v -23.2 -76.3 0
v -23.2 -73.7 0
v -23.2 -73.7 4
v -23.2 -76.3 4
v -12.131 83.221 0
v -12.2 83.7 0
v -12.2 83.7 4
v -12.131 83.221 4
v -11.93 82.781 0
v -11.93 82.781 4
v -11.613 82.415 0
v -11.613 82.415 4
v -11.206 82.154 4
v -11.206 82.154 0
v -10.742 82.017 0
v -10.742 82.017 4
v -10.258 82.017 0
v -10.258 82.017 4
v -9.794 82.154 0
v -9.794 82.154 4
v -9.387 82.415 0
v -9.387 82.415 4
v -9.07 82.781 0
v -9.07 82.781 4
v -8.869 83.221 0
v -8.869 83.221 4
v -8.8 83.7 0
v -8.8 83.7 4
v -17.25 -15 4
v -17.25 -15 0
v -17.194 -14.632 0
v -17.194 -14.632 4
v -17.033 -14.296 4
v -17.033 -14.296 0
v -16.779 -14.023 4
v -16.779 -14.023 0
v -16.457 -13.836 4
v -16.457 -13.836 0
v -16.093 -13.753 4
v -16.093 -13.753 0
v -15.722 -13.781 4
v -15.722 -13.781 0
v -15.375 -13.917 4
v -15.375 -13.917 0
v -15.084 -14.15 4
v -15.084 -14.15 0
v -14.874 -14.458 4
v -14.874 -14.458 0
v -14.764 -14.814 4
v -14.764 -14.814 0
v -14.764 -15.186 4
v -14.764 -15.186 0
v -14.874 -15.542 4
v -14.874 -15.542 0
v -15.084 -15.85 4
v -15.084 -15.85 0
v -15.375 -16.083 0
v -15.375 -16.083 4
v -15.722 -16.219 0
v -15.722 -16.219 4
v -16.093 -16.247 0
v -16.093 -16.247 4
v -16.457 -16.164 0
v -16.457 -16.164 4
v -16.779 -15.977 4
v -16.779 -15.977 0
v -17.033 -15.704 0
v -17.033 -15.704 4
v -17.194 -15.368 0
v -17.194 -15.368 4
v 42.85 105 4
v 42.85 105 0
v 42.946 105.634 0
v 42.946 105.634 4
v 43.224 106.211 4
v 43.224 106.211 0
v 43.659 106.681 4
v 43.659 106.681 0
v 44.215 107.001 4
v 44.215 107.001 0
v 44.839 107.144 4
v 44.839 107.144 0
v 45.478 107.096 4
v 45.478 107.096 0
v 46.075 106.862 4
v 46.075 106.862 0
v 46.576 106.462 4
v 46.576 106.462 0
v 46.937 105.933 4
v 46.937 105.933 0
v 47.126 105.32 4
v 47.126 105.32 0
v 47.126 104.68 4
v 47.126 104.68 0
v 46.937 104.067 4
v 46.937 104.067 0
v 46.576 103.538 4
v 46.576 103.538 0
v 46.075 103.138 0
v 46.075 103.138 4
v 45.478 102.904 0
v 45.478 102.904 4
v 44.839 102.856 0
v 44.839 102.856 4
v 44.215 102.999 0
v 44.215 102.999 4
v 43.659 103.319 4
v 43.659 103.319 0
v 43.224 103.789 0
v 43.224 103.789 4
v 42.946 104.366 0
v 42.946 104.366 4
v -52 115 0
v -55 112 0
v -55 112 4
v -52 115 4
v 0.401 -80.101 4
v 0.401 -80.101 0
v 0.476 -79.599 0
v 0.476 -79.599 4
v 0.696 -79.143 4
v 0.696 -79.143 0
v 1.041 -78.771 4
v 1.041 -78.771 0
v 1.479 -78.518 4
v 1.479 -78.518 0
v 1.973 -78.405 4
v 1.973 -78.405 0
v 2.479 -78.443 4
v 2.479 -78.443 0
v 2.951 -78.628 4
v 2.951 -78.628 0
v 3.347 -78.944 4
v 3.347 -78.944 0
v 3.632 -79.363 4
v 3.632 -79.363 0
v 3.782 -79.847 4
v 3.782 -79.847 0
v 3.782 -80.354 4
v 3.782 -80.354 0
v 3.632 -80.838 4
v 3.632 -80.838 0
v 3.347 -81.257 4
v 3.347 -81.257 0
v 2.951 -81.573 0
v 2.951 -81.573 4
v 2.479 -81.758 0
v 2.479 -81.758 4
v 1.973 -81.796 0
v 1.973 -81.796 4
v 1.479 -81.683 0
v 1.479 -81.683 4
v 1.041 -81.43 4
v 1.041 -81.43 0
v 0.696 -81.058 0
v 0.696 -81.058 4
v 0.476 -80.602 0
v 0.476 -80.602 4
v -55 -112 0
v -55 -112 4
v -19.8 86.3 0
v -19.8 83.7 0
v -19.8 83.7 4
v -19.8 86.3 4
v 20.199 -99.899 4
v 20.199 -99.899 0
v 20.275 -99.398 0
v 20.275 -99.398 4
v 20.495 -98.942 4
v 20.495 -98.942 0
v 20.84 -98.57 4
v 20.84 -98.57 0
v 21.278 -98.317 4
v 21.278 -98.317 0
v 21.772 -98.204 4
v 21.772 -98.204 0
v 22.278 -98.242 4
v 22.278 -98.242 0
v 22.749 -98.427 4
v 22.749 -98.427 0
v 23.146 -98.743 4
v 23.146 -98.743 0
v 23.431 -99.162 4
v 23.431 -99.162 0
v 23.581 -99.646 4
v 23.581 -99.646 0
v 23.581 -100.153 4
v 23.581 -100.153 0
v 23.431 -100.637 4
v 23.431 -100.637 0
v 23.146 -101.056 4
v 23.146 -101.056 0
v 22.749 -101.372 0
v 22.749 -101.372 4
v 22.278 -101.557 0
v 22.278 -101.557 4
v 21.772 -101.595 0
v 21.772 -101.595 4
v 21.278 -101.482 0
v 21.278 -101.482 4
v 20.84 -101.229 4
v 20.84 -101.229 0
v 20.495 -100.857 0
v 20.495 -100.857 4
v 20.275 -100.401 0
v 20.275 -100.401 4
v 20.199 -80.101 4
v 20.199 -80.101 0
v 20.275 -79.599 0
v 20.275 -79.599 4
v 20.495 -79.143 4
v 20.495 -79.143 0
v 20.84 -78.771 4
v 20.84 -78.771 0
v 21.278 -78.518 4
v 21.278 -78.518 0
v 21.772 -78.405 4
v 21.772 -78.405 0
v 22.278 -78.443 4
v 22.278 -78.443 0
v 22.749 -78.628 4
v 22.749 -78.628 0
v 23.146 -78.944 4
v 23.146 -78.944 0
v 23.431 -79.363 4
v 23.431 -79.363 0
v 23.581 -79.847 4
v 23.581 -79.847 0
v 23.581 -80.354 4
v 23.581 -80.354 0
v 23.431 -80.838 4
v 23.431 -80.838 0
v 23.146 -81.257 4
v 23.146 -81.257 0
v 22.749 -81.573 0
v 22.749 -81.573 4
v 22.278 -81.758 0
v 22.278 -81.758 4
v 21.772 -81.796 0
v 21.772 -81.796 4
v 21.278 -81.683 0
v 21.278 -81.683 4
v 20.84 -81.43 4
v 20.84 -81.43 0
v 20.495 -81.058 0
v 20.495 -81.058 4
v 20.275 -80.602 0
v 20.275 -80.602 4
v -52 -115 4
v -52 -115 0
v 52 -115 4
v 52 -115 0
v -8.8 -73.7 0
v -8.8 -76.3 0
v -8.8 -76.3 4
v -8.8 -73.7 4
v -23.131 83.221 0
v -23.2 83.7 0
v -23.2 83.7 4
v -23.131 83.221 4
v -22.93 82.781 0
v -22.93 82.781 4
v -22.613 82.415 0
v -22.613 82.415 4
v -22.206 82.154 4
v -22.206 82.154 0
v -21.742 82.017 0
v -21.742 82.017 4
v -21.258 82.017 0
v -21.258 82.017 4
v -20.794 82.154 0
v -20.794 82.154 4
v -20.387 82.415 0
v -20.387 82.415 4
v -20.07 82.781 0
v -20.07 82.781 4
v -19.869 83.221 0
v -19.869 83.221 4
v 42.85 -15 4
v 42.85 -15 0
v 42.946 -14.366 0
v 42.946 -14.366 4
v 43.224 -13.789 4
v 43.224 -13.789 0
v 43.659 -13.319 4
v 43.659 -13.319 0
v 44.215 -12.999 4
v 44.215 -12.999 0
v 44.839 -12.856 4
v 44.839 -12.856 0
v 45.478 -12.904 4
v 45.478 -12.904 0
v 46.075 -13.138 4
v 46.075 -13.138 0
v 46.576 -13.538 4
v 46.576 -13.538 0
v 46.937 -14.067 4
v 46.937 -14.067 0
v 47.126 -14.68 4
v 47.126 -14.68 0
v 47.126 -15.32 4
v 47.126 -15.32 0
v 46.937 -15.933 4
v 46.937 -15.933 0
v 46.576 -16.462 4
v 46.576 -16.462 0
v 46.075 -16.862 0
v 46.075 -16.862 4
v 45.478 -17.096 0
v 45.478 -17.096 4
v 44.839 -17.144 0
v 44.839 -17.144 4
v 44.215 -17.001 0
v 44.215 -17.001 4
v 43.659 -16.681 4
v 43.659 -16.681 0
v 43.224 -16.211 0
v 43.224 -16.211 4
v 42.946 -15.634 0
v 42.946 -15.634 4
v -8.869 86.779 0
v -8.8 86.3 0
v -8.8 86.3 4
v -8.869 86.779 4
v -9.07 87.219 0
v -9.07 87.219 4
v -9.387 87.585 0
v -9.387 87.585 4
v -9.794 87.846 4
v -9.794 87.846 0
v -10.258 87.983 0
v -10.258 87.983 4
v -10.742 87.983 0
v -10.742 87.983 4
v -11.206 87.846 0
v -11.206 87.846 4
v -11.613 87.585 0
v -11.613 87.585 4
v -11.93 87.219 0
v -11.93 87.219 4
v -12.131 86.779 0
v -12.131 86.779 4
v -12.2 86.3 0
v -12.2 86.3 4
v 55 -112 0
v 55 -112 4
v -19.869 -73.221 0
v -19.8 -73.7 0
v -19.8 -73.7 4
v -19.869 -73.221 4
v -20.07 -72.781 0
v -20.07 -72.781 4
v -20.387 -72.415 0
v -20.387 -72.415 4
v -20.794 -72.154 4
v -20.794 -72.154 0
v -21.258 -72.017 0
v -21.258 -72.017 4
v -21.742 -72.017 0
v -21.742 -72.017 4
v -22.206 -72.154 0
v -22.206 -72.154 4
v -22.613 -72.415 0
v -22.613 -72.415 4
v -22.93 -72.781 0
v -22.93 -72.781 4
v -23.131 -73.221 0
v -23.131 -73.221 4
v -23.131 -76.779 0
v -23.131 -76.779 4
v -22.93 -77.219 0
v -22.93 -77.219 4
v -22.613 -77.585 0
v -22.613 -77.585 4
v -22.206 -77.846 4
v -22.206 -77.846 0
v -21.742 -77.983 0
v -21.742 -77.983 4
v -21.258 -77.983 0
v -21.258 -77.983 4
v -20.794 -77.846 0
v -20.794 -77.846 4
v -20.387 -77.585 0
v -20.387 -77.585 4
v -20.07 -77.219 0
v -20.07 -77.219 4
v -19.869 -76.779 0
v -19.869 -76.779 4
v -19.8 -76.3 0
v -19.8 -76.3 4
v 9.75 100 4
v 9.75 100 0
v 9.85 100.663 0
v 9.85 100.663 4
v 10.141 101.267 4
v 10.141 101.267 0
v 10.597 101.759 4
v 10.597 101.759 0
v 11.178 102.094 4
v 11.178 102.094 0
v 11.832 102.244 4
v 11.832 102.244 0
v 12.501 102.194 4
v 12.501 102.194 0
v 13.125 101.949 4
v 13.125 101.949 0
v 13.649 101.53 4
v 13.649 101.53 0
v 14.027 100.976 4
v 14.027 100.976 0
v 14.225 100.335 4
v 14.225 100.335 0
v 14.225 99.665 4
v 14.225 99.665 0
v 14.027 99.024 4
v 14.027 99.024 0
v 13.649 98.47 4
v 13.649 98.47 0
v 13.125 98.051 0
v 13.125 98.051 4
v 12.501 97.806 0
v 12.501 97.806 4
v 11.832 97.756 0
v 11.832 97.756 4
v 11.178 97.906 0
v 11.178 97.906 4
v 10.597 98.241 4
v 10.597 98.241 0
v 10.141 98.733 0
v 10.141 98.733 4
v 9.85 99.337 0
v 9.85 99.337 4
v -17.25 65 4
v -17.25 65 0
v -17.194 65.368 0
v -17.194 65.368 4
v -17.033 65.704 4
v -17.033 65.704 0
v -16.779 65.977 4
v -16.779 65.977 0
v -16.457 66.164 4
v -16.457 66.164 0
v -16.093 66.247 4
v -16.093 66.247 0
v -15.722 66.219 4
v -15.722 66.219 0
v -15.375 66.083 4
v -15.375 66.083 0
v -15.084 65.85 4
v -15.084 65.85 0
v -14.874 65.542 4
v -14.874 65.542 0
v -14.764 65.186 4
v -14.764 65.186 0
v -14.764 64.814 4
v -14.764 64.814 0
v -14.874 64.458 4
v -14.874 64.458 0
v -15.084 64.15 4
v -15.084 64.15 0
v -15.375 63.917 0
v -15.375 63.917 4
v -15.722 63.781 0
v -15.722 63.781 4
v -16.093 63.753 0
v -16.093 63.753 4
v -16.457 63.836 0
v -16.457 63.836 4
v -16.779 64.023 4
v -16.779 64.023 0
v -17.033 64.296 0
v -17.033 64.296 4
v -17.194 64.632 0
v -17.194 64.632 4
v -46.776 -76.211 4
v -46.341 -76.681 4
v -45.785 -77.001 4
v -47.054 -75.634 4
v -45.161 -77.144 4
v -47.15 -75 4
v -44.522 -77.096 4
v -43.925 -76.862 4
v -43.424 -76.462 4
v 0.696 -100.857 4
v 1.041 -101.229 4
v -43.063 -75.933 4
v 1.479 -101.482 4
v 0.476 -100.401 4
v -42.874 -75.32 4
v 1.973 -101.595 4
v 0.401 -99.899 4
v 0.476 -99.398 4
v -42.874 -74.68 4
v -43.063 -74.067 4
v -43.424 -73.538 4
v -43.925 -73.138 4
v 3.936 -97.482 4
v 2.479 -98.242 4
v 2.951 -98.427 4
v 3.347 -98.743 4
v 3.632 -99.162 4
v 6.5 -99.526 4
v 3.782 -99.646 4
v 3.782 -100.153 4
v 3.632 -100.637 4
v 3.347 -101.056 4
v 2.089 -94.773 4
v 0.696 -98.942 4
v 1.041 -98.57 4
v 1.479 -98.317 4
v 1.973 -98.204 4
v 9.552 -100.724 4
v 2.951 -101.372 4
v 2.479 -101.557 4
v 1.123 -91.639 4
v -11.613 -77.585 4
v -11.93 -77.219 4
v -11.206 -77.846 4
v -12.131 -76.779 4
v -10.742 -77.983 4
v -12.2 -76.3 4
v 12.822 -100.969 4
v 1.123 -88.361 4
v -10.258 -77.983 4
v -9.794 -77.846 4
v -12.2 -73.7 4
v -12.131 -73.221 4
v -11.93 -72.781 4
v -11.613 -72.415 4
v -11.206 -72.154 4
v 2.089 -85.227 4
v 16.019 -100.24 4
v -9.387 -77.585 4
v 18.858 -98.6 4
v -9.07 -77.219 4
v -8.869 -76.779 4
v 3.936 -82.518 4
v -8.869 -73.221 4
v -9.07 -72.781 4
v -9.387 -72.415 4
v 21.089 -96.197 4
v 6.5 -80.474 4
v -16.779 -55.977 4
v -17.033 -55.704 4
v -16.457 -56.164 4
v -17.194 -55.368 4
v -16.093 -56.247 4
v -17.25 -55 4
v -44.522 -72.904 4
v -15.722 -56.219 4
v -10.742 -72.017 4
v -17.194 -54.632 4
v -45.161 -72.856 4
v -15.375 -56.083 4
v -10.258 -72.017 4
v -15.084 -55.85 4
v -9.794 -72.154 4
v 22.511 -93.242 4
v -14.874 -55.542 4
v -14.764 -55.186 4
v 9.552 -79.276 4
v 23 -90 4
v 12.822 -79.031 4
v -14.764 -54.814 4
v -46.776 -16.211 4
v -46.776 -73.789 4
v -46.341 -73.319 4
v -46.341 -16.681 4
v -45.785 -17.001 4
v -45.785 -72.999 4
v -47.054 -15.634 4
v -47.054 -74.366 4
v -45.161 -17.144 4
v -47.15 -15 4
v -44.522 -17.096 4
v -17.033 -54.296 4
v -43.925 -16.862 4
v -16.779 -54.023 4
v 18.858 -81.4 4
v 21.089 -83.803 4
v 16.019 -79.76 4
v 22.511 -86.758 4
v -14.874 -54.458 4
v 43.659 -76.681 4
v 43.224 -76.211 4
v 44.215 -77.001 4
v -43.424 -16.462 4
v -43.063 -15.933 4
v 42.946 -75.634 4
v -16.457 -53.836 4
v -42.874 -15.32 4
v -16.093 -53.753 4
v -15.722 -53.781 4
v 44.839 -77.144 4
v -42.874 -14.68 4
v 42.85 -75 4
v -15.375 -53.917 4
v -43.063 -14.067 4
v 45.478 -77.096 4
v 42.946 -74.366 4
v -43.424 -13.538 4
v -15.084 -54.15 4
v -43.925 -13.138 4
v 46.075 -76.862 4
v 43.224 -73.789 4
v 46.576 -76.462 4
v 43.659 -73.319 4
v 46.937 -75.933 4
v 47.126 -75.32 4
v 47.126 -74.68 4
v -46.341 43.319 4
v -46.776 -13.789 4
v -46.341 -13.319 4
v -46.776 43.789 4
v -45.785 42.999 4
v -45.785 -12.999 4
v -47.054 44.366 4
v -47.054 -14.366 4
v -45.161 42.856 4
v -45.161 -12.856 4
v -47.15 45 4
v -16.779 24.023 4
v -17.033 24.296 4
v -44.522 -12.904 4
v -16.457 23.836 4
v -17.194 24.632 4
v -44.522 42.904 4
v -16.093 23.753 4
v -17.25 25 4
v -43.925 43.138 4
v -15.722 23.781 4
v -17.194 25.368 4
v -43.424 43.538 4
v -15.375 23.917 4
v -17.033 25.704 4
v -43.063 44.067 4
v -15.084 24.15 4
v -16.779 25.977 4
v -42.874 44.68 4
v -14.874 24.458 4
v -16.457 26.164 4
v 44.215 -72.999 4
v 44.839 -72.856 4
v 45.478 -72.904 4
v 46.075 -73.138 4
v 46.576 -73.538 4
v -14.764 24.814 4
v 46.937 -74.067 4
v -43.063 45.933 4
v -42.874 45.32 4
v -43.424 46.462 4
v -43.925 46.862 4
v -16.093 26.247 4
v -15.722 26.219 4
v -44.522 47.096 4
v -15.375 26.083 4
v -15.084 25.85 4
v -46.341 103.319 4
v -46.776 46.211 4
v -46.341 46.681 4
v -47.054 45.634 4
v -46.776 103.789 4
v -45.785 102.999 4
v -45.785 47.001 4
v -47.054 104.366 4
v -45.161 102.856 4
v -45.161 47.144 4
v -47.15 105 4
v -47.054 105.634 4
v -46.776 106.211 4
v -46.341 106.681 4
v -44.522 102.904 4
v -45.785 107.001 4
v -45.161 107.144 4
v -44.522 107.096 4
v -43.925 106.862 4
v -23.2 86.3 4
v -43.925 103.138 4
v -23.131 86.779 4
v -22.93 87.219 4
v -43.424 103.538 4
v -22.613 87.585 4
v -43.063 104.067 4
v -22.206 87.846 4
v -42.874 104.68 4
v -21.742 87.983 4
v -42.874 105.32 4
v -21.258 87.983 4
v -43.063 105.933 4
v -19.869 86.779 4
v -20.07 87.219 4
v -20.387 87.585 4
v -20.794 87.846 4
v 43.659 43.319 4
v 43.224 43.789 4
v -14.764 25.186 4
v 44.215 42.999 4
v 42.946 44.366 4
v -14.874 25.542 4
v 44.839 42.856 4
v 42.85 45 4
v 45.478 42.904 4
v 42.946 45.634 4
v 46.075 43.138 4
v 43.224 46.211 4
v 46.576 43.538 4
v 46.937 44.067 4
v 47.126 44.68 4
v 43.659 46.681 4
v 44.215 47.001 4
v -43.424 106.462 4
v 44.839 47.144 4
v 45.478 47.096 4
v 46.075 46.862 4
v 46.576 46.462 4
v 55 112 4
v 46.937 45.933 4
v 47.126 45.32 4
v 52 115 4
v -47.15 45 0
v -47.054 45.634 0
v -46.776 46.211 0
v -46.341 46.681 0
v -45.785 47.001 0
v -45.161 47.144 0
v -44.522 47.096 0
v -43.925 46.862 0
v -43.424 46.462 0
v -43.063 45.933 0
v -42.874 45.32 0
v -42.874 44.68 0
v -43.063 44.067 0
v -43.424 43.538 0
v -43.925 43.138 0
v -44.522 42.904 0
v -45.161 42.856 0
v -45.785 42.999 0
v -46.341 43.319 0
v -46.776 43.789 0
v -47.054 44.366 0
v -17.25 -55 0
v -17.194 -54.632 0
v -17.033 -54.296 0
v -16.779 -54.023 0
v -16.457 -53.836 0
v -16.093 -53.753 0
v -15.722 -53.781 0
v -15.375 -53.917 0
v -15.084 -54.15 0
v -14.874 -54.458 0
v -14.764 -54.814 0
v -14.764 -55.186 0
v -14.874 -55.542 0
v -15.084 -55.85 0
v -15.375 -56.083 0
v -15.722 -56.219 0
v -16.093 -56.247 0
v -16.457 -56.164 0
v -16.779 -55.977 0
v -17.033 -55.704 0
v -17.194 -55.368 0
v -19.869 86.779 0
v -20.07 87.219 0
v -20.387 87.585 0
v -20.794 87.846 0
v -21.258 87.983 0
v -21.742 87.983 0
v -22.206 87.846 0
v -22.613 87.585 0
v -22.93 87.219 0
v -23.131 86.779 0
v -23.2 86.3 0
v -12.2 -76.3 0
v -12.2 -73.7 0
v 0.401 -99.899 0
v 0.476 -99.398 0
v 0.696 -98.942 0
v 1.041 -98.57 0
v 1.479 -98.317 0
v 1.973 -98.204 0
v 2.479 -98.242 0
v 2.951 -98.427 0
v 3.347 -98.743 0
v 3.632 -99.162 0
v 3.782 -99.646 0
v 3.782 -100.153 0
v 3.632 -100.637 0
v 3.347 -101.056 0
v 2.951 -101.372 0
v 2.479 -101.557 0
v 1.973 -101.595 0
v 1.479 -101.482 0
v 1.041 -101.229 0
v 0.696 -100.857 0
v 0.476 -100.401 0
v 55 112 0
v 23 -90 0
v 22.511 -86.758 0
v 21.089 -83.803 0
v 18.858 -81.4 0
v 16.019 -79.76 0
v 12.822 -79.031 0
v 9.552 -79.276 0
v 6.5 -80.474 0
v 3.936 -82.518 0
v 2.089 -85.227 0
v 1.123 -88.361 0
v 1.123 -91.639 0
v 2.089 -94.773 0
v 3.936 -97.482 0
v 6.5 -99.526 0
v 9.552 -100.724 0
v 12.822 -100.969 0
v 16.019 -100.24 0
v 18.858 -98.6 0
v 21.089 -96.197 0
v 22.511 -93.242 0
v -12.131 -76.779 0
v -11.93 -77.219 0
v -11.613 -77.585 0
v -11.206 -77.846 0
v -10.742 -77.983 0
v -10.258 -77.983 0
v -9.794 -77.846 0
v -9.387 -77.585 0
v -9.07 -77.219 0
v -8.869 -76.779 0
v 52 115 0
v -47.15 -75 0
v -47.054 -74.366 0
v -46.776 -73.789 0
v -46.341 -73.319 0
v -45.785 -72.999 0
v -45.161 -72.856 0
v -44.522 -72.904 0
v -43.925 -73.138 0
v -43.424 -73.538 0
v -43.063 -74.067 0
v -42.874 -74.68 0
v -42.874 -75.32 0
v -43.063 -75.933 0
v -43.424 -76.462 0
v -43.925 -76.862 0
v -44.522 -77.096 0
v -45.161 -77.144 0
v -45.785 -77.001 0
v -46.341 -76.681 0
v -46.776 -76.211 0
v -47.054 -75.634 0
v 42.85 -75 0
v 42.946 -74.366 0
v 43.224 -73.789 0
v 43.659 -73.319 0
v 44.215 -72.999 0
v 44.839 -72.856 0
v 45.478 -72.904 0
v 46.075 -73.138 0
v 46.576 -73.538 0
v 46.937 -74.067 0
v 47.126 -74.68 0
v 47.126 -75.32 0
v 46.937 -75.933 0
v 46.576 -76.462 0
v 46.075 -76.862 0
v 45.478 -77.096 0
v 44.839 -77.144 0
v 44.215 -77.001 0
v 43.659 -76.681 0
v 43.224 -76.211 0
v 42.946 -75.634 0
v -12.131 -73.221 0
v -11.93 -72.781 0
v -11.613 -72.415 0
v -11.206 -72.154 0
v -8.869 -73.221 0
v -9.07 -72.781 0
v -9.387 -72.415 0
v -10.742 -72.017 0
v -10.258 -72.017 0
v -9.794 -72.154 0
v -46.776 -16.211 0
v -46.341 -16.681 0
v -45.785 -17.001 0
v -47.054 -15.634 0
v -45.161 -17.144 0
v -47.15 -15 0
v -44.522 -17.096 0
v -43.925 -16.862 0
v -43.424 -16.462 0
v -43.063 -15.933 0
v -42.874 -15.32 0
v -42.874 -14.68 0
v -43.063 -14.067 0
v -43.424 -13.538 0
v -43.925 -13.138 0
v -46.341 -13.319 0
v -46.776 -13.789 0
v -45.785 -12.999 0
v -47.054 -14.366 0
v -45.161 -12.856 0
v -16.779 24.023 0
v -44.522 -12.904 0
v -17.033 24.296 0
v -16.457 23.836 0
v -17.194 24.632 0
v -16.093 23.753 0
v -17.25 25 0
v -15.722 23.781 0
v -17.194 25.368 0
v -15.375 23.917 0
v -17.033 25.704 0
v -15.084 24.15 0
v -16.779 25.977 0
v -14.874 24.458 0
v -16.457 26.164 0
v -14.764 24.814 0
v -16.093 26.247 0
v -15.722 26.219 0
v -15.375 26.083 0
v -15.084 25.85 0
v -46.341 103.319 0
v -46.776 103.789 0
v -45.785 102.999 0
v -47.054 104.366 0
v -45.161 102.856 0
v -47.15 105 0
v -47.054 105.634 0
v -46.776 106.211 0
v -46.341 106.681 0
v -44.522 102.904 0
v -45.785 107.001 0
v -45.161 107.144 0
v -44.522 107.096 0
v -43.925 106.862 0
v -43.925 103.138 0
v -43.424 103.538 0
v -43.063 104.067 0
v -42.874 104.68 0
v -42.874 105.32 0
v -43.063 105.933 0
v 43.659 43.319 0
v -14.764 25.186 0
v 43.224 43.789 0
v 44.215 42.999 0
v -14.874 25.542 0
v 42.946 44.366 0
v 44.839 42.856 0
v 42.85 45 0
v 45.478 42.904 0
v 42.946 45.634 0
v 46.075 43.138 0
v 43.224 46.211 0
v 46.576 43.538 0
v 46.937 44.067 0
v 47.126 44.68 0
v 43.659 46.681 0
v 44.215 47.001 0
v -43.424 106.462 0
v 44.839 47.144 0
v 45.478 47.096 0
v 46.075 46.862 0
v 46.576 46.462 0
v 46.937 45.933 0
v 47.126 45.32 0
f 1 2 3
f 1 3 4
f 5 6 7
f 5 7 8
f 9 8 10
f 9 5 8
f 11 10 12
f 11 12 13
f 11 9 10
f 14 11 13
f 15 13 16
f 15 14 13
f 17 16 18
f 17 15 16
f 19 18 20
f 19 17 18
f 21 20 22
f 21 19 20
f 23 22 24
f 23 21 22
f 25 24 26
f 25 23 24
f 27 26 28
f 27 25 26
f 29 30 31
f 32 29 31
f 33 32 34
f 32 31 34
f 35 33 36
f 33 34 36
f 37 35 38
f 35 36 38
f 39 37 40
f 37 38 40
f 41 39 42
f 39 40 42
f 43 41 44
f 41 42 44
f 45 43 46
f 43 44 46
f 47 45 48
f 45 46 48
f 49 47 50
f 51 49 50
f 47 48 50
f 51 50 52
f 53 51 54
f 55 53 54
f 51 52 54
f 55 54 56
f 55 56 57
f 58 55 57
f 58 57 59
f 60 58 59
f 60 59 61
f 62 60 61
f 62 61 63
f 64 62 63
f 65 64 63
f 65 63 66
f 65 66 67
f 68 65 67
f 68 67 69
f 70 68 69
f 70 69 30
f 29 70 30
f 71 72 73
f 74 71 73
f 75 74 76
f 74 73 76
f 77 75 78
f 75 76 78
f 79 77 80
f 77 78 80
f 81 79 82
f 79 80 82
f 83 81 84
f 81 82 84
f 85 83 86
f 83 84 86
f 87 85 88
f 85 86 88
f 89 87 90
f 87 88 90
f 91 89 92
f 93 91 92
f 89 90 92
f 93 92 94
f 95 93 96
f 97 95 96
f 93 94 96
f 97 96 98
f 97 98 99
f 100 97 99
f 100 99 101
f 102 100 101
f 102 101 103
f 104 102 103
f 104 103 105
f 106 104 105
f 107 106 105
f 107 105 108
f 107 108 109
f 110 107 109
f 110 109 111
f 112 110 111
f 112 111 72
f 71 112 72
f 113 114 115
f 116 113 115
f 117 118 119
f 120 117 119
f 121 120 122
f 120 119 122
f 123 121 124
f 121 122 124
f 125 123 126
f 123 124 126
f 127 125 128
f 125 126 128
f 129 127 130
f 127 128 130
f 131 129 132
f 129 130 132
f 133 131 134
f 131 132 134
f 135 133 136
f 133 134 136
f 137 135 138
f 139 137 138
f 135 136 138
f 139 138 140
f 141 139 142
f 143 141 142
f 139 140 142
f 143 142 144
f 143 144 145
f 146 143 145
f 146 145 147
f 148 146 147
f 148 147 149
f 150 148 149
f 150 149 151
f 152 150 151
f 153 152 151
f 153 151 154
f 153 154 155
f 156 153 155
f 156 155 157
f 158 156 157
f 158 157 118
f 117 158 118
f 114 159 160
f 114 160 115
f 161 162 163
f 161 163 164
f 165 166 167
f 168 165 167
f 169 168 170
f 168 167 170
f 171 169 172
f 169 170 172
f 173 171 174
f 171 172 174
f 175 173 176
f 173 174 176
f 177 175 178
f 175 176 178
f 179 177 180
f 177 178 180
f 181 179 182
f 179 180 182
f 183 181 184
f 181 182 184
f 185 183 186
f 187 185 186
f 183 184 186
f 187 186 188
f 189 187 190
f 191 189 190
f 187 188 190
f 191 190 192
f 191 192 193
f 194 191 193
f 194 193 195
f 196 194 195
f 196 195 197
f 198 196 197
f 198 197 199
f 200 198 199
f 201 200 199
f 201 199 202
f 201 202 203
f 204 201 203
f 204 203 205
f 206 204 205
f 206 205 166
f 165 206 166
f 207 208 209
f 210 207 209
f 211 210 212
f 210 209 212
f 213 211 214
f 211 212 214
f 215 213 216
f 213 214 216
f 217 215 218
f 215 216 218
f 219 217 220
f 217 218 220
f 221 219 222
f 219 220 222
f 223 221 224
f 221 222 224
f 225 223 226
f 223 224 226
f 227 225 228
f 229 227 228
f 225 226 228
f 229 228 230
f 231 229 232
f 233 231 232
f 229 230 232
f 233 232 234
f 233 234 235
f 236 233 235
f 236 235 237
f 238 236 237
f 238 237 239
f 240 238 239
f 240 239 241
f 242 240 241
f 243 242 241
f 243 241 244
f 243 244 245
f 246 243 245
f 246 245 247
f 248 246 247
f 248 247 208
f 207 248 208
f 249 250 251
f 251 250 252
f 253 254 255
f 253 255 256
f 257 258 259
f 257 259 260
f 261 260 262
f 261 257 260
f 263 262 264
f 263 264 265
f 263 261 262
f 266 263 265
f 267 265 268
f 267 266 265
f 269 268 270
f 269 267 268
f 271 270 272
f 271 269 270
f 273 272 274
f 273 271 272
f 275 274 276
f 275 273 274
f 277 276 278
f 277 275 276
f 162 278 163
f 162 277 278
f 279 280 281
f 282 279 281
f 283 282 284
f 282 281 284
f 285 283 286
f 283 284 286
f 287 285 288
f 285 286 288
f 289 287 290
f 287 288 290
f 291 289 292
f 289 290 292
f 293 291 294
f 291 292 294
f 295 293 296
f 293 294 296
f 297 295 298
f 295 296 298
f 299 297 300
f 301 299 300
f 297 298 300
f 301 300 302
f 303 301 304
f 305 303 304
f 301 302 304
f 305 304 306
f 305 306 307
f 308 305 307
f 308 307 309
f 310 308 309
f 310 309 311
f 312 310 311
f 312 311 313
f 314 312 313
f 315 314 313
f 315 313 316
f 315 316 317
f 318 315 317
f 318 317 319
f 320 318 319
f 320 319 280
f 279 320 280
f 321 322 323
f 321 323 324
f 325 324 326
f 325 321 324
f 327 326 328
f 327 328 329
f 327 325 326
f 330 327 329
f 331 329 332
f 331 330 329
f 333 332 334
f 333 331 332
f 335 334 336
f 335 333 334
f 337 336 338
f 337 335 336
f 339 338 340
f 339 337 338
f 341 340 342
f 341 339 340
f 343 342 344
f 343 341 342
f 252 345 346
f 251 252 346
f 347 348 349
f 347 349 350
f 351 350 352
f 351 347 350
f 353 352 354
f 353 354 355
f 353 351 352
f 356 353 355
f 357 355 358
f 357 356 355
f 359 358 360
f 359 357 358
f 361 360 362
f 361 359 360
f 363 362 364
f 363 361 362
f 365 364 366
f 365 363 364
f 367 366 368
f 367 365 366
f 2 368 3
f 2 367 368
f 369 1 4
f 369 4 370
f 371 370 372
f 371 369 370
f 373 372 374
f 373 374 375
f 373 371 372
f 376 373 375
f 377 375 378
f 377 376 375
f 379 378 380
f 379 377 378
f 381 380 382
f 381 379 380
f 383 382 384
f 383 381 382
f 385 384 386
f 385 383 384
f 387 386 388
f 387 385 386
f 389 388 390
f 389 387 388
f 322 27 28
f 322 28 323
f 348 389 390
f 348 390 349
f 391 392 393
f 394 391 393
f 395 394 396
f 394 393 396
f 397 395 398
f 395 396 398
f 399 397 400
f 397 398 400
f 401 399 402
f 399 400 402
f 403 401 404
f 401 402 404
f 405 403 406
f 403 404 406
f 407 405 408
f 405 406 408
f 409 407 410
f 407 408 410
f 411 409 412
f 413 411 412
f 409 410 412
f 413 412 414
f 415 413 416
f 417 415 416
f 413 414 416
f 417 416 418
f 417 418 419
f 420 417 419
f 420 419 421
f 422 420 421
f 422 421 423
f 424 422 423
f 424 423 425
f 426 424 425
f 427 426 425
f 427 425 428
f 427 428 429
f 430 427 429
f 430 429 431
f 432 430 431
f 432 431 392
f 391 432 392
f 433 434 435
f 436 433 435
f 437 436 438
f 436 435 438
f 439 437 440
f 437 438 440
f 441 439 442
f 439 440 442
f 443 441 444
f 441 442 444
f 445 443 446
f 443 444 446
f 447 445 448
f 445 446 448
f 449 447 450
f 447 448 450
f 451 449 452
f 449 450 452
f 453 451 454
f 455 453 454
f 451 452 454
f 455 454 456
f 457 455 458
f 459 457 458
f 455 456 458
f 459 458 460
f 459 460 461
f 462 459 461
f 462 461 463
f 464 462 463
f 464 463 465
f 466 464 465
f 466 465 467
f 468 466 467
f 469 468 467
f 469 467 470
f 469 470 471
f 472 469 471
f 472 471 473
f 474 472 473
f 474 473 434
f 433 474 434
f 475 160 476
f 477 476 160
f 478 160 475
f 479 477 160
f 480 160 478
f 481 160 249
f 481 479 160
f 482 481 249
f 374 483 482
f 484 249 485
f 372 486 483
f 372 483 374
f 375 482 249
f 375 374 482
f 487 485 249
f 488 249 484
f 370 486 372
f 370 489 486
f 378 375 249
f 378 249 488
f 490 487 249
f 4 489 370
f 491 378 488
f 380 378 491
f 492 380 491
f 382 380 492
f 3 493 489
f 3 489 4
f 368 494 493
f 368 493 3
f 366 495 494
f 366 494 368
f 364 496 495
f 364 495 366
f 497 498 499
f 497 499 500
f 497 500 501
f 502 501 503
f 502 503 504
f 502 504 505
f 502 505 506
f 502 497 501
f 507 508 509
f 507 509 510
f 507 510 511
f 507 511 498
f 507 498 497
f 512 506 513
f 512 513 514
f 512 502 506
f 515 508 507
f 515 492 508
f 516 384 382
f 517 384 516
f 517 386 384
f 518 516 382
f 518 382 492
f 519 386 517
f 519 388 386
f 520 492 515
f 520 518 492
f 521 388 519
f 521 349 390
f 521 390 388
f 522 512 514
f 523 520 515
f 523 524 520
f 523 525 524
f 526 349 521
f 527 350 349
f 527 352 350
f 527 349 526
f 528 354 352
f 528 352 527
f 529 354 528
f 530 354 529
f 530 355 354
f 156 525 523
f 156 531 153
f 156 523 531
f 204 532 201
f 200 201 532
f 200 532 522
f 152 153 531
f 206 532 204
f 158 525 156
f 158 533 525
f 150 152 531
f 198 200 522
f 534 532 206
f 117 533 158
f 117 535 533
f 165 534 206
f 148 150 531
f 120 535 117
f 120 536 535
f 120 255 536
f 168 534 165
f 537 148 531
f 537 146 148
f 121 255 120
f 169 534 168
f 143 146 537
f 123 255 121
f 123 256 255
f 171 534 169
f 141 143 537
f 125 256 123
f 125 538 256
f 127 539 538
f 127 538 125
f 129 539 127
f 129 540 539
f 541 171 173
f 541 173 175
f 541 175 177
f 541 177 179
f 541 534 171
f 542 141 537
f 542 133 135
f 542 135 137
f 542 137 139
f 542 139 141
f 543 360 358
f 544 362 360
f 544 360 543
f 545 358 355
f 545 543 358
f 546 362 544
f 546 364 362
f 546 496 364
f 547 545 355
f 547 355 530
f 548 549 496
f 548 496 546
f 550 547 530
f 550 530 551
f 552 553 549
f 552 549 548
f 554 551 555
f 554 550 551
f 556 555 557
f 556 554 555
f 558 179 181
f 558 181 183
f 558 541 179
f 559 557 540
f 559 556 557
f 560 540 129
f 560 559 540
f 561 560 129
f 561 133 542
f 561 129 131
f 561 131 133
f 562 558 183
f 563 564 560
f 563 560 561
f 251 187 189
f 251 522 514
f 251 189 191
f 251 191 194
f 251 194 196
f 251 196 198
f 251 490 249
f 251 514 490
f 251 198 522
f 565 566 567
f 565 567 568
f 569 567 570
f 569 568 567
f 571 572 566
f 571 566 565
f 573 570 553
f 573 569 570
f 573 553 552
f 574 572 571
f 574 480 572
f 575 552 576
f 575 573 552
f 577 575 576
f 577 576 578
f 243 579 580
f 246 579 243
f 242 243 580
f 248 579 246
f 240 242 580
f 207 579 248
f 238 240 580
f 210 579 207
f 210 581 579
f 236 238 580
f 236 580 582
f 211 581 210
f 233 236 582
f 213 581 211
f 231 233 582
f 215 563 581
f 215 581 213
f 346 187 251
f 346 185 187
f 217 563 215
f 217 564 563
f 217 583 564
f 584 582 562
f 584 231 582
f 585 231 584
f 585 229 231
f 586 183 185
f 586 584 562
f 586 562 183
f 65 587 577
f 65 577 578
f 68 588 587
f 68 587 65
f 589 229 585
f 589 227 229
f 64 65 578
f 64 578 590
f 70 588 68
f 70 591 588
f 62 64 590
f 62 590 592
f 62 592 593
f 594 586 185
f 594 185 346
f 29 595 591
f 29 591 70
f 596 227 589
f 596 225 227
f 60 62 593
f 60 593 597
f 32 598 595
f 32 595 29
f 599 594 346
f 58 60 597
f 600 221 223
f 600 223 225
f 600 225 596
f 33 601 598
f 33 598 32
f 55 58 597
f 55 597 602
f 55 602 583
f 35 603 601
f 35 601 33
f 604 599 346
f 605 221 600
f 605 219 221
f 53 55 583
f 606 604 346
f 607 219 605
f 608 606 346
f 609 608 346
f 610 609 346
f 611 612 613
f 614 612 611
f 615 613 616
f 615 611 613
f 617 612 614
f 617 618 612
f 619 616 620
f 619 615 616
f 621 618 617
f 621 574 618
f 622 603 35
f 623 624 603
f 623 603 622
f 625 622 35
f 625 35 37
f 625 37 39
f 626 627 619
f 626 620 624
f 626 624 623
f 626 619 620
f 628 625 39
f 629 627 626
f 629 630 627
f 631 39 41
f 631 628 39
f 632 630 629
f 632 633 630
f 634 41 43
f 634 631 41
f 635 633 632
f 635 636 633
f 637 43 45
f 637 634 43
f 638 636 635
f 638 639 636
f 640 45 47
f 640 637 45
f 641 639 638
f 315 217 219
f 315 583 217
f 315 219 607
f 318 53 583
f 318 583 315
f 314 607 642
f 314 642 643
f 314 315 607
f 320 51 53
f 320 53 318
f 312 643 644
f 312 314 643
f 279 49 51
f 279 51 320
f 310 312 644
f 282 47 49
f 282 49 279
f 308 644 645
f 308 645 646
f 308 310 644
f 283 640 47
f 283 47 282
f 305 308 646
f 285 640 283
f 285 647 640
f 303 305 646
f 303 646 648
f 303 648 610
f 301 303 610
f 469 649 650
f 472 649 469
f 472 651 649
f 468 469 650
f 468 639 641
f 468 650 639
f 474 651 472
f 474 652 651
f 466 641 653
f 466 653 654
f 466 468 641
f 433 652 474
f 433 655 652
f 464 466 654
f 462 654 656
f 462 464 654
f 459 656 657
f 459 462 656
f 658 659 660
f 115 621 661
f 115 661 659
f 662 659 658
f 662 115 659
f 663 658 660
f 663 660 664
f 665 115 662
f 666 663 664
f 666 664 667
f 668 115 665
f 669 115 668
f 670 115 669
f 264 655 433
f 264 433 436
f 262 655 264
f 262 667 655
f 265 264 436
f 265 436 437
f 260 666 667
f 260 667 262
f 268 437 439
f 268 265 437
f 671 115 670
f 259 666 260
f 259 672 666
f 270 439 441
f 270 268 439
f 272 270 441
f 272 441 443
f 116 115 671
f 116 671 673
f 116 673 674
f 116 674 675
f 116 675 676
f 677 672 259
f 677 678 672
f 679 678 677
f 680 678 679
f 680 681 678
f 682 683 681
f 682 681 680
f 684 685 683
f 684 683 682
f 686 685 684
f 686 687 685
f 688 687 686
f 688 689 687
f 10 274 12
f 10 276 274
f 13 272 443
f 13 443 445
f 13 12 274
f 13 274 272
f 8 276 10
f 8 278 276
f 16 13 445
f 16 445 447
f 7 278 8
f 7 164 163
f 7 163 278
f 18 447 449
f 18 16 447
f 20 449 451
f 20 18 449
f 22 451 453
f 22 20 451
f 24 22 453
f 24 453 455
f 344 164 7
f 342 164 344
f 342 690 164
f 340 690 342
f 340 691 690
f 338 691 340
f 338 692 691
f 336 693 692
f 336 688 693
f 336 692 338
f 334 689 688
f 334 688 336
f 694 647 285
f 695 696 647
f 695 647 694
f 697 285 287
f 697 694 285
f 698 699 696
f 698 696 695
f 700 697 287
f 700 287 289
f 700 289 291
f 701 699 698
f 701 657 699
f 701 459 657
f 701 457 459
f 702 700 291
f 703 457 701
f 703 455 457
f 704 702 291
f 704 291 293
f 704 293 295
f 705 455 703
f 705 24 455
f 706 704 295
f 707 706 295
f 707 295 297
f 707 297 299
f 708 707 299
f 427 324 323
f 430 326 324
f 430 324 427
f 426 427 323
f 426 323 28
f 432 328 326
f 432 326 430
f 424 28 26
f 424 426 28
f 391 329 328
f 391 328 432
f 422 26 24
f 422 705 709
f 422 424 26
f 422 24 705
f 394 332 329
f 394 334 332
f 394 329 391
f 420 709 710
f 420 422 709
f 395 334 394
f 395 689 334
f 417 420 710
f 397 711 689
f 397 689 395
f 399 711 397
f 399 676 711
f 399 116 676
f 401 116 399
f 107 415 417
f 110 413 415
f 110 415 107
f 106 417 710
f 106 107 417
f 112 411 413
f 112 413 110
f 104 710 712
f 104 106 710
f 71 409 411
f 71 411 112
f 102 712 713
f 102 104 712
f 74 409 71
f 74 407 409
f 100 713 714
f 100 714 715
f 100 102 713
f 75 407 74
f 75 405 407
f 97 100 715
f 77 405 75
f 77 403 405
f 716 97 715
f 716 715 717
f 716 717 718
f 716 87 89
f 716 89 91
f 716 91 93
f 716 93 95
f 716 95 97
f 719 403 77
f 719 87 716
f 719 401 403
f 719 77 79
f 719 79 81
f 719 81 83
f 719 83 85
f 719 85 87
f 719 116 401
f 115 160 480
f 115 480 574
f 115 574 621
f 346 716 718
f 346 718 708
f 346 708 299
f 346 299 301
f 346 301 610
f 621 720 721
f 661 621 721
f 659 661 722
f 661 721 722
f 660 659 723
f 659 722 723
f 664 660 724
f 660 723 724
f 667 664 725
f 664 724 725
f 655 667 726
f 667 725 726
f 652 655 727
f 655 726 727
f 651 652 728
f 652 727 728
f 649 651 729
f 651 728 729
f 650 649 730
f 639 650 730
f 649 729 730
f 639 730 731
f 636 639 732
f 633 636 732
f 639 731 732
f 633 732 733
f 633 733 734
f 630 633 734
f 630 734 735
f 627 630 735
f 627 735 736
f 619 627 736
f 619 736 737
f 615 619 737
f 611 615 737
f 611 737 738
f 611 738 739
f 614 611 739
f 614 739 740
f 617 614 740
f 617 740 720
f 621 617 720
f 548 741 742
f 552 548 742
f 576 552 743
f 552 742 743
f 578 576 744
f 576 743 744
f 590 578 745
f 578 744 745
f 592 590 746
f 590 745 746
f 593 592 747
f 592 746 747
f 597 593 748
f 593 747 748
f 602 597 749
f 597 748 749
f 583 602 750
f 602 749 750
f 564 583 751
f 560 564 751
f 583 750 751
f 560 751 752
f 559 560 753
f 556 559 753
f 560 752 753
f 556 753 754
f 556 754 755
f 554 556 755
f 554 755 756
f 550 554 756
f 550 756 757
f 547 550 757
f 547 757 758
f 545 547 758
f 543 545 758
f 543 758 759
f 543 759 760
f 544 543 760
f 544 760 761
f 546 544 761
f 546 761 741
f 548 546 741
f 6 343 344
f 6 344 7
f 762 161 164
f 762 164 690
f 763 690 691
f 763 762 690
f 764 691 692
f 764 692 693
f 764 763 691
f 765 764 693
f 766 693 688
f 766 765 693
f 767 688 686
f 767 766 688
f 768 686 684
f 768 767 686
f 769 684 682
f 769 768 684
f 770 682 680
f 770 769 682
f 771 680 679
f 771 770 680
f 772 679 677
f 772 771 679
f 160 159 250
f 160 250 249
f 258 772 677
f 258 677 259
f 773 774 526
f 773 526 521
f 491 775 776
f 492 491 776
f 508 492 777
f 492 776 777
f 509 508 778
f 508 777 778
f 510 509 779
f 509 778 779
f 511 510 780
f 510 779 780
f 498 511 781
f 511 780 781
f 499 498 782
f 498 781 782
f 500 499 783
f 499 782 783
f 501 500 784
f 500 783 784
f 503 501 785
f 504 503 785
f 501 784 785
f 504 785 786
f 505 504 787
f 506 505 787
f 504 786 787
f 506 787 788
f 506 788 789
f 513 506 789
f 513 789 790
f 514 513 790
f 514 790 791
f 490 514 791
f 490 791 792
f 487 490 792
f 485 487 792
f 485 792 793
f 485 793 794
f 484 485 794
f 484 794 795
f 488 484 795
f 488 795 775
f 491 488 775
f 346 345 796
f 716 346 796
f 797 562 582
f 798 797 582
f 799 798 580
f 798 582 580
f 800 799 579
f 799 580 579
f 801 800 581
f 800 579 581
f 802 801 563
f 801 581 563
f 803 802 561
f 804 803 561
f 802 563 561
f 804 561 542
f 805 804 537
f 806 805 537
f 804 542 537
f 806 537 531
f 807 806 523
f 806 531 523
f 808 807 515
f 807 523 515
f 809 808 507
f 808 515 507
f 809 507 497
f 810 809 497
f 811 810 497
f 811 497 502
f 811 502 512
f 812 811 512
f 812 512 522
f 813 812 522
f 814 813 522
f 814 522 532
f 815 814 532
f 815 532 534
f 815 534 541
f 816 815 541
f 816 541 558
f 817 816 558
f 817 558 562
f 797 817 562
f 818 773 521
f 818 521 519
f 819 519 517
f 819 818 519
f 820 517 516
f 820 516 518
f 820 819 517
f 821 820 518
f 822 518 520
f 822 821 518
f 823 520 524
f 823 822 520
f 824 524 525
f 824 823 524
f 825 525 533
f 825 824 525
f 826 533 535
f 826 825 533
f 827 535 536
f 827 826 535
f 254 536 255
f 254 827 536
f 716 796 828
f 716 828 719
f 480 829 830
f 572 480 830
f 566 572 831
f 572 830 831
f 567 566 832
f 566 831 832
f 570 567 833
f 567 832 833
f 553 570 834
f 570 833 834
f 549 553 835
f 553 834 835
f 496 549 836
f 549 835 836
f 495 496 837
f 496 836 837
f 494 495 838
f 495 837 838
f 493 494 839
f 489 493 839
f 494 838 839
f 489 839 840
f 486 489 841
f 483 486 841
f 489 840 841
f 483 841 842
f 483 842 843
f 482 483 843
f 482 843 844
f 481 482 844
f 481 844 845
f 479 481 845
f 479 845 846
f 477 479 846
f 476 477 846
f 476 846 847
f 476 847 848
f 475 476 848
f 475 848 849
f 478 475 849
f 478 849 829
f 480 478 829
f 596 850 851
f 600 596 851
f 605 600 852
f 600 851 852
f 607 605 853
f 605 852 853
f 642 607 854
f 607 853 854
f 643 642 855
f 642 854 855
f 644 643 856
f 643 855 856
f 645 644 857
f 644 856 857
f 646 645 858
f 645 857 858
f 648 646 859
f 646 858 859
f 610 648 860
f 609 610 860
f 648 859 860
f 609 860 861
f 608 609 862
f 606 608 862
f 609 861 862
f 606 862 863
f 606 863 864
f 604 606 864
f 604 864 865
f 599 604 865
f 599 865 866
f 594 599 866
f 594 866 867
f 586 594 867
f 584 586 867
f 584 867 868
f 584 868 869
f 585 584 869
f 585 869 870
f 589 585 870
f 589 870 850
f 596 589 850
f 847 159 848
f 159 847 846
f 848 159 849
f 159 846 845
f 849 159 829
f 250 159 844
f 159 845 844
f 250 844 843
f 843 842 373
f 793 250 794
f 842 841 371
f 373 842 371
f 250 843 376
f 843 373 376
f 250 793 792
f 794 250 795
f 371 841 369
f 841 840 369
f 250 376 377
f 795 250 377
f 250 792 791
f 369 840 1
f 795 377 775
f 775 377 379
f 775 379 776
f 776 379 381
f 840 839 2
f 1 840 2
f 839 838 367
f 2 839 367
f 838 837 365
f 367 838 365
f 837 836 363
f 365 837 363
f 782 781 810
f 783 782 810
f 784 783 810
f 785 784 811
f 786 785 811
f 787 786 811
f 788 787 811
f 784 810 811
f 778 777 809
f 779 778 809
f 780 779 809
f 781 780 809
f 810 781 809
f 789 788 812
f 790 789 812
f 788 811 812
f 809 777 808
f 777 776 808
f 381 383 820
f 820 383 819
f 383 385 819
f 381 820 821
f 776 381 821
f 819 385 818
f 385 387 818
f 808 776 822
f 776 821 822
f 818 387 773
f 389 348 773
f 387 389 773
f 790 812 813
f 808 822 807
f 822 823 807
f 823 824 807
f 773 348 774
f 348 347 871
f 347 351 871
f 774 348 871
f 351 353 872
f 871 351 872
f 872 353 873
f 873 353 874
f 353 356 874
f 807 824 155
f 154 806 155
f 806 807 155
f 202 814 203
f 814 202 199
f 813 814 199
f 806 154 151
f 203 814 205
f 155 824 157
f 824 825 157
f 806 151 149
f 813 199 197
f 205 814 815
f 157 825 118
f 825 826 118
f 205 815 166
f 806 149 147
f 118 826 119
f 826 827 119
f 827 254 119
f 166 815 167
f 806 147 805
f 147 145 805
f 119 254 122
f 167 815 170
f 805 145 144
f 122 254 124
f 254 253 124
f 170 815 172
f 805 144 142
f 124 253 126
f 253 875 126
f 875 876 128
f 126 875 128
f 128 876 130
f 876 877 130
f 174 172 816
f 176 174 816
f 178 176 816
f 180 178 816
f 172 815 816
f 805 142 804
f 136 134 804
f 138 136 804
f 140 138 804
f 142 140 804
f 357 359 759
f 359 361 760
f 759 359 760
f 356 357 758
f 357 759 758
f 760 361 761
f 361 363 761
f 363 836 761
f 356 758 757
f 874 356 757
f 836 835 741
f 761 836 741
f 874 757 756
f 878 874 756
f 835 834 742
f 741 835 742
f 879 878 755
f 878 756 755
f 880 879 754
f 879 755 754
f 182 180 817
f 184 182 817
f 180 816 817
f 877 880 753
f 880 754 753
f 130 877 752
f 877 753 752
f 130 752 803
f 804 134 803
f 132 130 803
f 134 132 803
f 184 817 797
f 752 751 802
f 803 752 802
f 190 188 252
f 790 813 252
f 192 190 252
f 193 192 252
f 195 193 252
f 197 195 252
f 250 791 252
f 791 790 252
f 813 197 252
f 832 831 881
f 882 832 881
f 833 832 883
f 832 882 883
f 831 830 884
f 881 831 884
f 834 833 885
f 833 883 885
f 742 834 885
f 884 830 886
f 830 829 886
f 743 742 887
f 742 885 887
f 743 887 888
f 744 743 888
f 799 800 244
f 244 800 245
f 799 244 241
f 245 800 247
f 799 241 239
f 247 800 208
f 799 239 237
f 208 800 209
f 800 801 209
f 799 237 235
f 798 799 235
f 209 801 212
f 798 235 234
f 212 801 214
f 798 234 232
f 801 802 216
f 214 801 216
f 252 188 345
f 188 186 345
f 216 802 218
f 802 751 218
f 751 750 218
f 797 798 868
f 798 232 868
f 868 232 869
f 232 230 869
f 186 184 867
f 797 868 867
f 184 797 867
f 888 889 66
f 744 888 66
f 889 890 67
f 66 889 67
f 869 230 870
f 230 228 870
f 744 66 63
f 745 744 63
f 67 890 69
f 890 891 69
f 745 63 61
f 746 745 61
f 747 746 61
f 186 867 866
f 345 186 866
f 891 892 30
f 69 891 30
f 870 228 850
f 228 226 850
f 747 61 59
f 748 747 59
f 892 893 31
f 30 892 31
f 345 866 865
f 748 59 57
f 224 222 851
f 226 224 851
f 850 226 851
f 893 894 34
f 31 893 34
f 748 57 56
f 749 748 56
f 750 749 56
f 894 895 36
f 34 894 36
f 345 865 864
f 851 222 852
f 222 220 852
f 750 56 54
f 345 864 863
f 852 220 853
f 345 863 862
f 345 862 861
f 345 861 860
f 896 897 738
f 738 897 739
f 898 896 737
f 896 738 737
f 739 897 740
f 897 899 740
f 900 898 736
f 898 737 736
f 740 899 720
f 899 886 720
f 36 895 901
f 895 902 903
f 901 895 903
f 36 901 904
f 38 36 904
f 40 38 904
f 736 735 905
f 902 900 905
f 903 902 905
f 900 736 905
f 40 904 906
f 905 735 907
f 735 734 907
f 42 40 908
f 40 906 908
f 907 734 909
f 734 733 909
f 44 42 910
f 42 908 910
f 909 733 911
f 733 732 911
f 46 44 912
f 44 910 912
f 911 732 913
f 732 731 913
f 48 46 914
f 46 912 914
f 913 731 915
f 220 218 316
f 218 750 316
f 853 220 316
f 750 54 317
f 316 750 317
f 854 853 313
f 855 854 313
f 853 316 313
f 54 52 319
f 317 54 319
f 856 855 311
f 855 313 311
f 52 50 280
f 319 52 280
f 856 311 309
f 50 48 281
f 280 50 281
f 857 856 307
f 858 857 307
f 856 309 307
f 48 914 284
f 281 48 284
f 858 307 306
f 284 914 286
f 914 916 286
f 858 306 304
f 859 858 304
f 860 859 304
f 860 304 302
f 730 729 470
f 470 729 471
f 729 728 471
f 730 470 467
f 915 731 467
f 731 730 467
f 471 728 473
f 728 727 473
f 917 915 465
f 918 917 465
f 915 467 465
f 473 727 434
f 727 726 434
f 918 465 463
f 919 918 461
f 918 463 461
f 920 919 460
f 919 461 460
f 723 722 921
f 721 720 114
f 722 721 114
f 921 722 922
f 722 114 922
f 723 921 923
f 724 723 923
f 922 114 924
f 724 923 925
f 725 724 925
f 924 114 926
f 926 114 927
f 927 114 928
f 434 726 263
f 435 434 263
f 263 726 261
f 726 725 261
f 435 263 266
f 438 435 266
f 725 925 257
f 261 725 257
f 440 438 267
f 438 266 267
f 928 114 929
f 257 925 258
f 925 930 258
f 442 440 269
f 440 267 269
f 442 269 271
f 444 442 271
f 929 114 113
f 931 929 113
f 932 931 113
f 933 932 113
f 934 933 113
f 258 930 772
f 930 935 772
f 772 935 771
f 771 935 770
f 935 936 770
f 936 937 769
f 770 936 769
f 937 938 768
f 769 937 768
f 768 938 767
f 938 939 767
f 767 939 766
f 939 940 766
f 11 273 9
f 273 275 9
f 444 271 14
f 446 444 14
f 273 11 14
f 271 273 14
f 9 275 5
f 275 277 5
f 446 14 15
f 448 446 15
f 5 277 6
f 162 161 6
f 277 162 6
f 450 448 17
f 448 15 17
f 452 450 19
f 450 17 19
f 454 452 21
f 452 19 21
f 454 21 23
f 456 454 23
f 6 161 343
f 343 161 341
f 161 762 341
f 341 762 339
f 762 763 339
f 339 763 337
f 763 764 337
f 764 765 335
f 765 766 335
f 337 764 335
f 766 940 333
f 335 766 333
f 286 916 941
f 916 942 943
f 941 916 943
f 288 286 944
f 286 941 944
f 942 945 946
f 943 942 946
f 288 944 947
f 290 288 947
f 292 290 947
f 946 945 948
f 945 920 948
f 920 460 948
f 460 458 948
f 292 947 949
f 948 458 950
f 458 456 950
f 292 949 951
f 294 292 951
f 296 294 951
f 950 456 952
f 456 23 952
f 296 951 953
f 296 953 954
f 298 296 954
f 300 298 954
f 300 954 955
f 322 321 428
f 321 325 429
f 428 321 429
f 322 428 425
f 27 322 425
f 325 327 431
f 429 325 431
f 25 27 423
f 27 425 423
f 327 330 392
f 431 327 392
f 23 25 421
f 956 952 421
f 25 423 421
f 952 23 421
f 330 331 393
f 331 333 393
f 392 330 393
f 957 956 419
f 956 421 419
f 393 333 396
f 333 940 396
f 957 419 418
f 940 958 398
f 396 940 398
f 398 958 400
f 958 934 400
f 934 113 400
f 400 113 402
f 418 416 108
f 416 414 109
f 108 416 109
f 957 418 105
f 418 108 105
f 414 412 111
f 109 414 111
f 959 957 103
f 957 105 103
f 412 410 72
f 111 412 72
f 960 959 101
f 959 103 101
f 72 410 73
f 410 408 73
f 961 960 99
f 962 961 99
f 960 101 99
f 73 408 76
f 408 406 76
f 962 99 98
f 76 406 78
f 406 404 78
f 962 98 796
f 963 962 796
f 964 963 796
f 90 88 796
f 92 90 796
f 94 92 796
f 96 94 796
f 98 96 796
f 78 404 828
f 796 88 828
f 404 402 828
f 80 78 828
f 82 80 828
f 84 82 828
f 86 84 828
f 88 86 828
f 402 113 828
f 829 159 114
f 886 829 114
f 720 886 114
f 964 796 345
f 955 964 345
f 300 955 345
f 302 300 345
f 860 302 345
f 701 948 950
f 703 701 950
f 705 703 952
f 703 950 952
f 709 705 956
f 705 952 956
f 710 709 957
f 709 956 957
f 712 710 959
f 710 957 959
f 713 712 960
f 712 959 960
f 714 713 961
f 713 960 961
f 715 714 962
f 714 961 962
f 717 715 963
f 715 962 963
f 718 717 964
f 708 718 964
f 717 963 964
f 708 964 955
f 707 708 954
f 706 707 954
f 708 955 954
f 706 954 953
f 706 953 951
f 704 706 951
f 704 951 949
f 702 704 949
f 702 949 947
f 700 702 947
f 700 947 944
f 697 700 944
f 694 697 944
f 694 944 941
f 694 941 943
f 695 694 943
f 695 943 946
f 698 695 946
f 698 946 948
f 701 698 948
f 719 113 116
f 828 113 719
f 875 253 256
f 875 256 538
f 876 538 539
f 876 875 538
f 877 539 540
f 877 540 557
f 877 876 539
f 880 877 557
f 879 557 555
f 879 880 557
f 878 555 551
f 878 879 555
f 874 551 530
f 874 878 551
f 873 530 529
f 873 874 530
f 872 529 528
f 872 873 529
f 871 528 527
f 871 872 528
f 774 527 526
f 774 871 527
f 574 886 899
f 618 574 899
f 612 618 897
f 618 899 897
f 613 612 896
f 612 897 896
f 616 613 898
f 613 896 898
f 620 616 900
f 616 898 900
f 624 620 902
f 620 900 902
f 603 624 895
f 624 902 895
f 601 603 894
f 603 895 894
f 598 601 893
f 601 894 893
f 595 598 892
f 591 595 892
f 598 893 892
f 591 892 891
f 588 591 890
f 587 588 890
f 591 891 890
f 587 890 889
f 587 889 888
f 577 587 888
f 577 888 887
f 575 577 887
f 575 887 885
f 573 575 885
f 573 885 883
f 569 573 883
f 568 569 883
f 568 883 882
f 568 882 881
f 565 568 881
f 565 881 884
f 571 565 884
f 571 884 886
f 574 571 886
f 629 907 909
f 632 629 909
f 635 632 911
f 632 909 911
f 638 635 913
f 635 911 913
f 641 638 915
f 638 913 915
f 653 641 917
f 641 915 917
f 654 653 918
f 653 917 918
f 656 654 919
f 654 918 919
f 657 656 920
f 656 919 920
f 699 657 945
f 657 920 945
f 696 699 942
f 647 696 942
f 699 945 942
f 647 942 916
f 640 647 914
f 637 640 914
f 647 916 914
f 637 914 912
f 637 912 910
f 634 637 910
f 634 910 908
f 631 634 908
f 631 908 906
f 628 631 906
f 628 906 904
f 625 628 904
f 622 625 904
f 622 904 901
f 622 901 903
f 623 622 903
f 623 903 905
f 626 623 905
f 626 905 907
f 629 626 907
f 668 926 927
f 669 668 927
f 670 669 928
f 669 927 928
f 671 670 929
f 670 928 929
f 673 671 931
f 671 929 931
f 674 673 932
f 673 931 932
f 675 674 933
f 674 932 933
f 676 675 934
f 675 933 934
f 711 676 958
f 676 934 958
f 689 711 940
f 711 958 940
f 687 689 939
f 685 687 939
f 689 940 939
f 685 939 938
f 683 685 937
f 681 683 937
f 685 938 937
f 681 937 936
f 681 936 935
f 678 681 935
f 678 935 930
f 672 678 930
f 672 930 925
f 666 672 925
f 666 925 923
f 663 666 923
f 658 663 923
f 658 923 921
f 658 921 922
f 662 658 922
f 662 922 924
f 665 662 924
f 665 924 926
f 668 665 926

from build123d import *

# Parameters (mm, degrees)
SKIZZE1_W                       = 110
SKIZZE1_H                       = 230
AUFSATZ_LINEAR_AUSTRAGEN1_DEPTH = 4
M3_GEWINDEBOHRUNG1_D            = 2.5
DURCHGANGSLOCH_F_R_M41_D        = 4.3
DURCHGANGSLOCH_F_R_M33_DEPTH    = 4
DURCHGANGSLOCH_F_R_M32_D        = 3.4
SKIZZE10_R                      = 11
SCHNITT_LINEAR_AUSTRAGEN1_DEPTH = 128.538229563
DURCHGANGSLOCH_F_R_M42_D        = 4.5
FASE1_SIZE                      = 3


# Read off the part's stored shape, not the designer's step: Durchgangsloch für M33
with BuildPart() as part:
    # Skizze1 → Aufsatz-Linear austragen1 (new body)
    with BuildSketch(Plane.XY):
        Rectangle(SKIZZE1_W, SKIZZE1_H)
    extrude(amount=AUFSATZ_LINEAR_AUSTRAGEN1_DEPTH)

    # M3 Gewindebohrung1 (through all)
    with Locations(Plane.XY.offset(4)):
        with Locations((-16, 65), (-16, 25), (-16, -15), (-16, -55)):
            Hole(M3_GEWINDEBOHRUNG1_D / 2)

    # Durchgangsloch für M41 (through all)
    with Locations(Plane.XY.offset(4)):
        with Locations((-45, 105), (45, 105), (-45, 45), (-45, -15), (45, 45), (45, -15), (45, -75), (-45, -75)):
            Hole(DURCHGANGSLOCH_F_R_M41_D / 2)

    # Durchgangsloch für M33 outline → Durchgangsloch für M33 (cut)
    with BuildSketch(Plane.XY):
        with BuildLine():
            Line((-8.8, 83.7), (-8.8, 86.3))
            ThreePointArc((-8.8, 86.3), (-10.5, 88), (-12.2, 86.3))
            Line((-12.2, 86.3), (-12.2, 83.7))
            ThreePointArc((-12.2, 83.7), (-10.5, 82), (-8.8, 83.7))
        make_face()
        with BuildLine():
            ThreePointArc((-8.8, -73.7), (-10.5, -72), (-12.2, -73.7))
            Line((-12.2, -73.7), (-12.2, -76.3))
            ThreePointArc((-12.2, -76.3), (-10.5, -78), (-8.8, -76.3))
            Line((-8.8, -76.3), (-8.8, -73.7))
        make_face()
        with BuildLine():
            Line((-19.8, 83.7), (-19.8, 86.3))
            ThreePointArc((-19.8, 86.3), (-21.5, 88), (-23.2, 86.3))
            Line((-23.2, 86.3), (-23.2, 83.7))
            ThreePointArc((-23.2, 83.7), (-21.5, 82), (-19.8, 83.7))
        make_face()
        with BuildLine():
            ThreePointArc((-19.8, -73.7), (-21.5, -72), (-23.2, -73.7))
            Line((-23.2, -73.7), (-23.2, -76.3))
            ThreePointArc((-23.2, -76.3), (-21.5, -78), (-19.8, -76.3))
            Line((-19.8, -76.3), (-19.8, -73.7))
        make_face()
    extrude(amount=DURCHGANGSLOCH_F_R_M33_DEPTH, mode=Mode.SUBTRACT)

    # Durchgangsloch für M32 (through all)
    with Locations(Plane.XY.offset(4)):
        with Locations((21.899494937, -80.100505063), (2.100505063, -80.100505063), (21.899494937, -99.899494937), (2.100505063, -99.899494937)):
            Hole(DURCHGANGSLOCH_F_R_M32_D / 2)

    # Skizze10 → Schnitt-Linear austragen1 (cut, through all)
    with BuildSketch(Plane.XY.offset(4)):
        with Locations((12, -90)):
            Circle(SKIZZE10_R)
    extrude(amount=-SCHNITT_LINEAR_AUSTRAGEN1_DEPTH, mode=Mode.SUBTRACT)

    # Durchgangsloch für M42 (through all)
    with Locations(Plane.XY.offset(4)):
        with Locations((12, 100)):
            Hole(DURCHGANGSLOCH_F_R_M42_D / 2)

    # Fase1
    fase1_edges = [part.edges().sort_by_distance(p)[0] for p in [
        (-55, 115, 2),
        (55, 115, 2),
        (55, -115, 2),
        (-55, -115, 2),
    ]]
    chamfer(fase1_edges, length=FASE1_SIZE)


solid = part.part
